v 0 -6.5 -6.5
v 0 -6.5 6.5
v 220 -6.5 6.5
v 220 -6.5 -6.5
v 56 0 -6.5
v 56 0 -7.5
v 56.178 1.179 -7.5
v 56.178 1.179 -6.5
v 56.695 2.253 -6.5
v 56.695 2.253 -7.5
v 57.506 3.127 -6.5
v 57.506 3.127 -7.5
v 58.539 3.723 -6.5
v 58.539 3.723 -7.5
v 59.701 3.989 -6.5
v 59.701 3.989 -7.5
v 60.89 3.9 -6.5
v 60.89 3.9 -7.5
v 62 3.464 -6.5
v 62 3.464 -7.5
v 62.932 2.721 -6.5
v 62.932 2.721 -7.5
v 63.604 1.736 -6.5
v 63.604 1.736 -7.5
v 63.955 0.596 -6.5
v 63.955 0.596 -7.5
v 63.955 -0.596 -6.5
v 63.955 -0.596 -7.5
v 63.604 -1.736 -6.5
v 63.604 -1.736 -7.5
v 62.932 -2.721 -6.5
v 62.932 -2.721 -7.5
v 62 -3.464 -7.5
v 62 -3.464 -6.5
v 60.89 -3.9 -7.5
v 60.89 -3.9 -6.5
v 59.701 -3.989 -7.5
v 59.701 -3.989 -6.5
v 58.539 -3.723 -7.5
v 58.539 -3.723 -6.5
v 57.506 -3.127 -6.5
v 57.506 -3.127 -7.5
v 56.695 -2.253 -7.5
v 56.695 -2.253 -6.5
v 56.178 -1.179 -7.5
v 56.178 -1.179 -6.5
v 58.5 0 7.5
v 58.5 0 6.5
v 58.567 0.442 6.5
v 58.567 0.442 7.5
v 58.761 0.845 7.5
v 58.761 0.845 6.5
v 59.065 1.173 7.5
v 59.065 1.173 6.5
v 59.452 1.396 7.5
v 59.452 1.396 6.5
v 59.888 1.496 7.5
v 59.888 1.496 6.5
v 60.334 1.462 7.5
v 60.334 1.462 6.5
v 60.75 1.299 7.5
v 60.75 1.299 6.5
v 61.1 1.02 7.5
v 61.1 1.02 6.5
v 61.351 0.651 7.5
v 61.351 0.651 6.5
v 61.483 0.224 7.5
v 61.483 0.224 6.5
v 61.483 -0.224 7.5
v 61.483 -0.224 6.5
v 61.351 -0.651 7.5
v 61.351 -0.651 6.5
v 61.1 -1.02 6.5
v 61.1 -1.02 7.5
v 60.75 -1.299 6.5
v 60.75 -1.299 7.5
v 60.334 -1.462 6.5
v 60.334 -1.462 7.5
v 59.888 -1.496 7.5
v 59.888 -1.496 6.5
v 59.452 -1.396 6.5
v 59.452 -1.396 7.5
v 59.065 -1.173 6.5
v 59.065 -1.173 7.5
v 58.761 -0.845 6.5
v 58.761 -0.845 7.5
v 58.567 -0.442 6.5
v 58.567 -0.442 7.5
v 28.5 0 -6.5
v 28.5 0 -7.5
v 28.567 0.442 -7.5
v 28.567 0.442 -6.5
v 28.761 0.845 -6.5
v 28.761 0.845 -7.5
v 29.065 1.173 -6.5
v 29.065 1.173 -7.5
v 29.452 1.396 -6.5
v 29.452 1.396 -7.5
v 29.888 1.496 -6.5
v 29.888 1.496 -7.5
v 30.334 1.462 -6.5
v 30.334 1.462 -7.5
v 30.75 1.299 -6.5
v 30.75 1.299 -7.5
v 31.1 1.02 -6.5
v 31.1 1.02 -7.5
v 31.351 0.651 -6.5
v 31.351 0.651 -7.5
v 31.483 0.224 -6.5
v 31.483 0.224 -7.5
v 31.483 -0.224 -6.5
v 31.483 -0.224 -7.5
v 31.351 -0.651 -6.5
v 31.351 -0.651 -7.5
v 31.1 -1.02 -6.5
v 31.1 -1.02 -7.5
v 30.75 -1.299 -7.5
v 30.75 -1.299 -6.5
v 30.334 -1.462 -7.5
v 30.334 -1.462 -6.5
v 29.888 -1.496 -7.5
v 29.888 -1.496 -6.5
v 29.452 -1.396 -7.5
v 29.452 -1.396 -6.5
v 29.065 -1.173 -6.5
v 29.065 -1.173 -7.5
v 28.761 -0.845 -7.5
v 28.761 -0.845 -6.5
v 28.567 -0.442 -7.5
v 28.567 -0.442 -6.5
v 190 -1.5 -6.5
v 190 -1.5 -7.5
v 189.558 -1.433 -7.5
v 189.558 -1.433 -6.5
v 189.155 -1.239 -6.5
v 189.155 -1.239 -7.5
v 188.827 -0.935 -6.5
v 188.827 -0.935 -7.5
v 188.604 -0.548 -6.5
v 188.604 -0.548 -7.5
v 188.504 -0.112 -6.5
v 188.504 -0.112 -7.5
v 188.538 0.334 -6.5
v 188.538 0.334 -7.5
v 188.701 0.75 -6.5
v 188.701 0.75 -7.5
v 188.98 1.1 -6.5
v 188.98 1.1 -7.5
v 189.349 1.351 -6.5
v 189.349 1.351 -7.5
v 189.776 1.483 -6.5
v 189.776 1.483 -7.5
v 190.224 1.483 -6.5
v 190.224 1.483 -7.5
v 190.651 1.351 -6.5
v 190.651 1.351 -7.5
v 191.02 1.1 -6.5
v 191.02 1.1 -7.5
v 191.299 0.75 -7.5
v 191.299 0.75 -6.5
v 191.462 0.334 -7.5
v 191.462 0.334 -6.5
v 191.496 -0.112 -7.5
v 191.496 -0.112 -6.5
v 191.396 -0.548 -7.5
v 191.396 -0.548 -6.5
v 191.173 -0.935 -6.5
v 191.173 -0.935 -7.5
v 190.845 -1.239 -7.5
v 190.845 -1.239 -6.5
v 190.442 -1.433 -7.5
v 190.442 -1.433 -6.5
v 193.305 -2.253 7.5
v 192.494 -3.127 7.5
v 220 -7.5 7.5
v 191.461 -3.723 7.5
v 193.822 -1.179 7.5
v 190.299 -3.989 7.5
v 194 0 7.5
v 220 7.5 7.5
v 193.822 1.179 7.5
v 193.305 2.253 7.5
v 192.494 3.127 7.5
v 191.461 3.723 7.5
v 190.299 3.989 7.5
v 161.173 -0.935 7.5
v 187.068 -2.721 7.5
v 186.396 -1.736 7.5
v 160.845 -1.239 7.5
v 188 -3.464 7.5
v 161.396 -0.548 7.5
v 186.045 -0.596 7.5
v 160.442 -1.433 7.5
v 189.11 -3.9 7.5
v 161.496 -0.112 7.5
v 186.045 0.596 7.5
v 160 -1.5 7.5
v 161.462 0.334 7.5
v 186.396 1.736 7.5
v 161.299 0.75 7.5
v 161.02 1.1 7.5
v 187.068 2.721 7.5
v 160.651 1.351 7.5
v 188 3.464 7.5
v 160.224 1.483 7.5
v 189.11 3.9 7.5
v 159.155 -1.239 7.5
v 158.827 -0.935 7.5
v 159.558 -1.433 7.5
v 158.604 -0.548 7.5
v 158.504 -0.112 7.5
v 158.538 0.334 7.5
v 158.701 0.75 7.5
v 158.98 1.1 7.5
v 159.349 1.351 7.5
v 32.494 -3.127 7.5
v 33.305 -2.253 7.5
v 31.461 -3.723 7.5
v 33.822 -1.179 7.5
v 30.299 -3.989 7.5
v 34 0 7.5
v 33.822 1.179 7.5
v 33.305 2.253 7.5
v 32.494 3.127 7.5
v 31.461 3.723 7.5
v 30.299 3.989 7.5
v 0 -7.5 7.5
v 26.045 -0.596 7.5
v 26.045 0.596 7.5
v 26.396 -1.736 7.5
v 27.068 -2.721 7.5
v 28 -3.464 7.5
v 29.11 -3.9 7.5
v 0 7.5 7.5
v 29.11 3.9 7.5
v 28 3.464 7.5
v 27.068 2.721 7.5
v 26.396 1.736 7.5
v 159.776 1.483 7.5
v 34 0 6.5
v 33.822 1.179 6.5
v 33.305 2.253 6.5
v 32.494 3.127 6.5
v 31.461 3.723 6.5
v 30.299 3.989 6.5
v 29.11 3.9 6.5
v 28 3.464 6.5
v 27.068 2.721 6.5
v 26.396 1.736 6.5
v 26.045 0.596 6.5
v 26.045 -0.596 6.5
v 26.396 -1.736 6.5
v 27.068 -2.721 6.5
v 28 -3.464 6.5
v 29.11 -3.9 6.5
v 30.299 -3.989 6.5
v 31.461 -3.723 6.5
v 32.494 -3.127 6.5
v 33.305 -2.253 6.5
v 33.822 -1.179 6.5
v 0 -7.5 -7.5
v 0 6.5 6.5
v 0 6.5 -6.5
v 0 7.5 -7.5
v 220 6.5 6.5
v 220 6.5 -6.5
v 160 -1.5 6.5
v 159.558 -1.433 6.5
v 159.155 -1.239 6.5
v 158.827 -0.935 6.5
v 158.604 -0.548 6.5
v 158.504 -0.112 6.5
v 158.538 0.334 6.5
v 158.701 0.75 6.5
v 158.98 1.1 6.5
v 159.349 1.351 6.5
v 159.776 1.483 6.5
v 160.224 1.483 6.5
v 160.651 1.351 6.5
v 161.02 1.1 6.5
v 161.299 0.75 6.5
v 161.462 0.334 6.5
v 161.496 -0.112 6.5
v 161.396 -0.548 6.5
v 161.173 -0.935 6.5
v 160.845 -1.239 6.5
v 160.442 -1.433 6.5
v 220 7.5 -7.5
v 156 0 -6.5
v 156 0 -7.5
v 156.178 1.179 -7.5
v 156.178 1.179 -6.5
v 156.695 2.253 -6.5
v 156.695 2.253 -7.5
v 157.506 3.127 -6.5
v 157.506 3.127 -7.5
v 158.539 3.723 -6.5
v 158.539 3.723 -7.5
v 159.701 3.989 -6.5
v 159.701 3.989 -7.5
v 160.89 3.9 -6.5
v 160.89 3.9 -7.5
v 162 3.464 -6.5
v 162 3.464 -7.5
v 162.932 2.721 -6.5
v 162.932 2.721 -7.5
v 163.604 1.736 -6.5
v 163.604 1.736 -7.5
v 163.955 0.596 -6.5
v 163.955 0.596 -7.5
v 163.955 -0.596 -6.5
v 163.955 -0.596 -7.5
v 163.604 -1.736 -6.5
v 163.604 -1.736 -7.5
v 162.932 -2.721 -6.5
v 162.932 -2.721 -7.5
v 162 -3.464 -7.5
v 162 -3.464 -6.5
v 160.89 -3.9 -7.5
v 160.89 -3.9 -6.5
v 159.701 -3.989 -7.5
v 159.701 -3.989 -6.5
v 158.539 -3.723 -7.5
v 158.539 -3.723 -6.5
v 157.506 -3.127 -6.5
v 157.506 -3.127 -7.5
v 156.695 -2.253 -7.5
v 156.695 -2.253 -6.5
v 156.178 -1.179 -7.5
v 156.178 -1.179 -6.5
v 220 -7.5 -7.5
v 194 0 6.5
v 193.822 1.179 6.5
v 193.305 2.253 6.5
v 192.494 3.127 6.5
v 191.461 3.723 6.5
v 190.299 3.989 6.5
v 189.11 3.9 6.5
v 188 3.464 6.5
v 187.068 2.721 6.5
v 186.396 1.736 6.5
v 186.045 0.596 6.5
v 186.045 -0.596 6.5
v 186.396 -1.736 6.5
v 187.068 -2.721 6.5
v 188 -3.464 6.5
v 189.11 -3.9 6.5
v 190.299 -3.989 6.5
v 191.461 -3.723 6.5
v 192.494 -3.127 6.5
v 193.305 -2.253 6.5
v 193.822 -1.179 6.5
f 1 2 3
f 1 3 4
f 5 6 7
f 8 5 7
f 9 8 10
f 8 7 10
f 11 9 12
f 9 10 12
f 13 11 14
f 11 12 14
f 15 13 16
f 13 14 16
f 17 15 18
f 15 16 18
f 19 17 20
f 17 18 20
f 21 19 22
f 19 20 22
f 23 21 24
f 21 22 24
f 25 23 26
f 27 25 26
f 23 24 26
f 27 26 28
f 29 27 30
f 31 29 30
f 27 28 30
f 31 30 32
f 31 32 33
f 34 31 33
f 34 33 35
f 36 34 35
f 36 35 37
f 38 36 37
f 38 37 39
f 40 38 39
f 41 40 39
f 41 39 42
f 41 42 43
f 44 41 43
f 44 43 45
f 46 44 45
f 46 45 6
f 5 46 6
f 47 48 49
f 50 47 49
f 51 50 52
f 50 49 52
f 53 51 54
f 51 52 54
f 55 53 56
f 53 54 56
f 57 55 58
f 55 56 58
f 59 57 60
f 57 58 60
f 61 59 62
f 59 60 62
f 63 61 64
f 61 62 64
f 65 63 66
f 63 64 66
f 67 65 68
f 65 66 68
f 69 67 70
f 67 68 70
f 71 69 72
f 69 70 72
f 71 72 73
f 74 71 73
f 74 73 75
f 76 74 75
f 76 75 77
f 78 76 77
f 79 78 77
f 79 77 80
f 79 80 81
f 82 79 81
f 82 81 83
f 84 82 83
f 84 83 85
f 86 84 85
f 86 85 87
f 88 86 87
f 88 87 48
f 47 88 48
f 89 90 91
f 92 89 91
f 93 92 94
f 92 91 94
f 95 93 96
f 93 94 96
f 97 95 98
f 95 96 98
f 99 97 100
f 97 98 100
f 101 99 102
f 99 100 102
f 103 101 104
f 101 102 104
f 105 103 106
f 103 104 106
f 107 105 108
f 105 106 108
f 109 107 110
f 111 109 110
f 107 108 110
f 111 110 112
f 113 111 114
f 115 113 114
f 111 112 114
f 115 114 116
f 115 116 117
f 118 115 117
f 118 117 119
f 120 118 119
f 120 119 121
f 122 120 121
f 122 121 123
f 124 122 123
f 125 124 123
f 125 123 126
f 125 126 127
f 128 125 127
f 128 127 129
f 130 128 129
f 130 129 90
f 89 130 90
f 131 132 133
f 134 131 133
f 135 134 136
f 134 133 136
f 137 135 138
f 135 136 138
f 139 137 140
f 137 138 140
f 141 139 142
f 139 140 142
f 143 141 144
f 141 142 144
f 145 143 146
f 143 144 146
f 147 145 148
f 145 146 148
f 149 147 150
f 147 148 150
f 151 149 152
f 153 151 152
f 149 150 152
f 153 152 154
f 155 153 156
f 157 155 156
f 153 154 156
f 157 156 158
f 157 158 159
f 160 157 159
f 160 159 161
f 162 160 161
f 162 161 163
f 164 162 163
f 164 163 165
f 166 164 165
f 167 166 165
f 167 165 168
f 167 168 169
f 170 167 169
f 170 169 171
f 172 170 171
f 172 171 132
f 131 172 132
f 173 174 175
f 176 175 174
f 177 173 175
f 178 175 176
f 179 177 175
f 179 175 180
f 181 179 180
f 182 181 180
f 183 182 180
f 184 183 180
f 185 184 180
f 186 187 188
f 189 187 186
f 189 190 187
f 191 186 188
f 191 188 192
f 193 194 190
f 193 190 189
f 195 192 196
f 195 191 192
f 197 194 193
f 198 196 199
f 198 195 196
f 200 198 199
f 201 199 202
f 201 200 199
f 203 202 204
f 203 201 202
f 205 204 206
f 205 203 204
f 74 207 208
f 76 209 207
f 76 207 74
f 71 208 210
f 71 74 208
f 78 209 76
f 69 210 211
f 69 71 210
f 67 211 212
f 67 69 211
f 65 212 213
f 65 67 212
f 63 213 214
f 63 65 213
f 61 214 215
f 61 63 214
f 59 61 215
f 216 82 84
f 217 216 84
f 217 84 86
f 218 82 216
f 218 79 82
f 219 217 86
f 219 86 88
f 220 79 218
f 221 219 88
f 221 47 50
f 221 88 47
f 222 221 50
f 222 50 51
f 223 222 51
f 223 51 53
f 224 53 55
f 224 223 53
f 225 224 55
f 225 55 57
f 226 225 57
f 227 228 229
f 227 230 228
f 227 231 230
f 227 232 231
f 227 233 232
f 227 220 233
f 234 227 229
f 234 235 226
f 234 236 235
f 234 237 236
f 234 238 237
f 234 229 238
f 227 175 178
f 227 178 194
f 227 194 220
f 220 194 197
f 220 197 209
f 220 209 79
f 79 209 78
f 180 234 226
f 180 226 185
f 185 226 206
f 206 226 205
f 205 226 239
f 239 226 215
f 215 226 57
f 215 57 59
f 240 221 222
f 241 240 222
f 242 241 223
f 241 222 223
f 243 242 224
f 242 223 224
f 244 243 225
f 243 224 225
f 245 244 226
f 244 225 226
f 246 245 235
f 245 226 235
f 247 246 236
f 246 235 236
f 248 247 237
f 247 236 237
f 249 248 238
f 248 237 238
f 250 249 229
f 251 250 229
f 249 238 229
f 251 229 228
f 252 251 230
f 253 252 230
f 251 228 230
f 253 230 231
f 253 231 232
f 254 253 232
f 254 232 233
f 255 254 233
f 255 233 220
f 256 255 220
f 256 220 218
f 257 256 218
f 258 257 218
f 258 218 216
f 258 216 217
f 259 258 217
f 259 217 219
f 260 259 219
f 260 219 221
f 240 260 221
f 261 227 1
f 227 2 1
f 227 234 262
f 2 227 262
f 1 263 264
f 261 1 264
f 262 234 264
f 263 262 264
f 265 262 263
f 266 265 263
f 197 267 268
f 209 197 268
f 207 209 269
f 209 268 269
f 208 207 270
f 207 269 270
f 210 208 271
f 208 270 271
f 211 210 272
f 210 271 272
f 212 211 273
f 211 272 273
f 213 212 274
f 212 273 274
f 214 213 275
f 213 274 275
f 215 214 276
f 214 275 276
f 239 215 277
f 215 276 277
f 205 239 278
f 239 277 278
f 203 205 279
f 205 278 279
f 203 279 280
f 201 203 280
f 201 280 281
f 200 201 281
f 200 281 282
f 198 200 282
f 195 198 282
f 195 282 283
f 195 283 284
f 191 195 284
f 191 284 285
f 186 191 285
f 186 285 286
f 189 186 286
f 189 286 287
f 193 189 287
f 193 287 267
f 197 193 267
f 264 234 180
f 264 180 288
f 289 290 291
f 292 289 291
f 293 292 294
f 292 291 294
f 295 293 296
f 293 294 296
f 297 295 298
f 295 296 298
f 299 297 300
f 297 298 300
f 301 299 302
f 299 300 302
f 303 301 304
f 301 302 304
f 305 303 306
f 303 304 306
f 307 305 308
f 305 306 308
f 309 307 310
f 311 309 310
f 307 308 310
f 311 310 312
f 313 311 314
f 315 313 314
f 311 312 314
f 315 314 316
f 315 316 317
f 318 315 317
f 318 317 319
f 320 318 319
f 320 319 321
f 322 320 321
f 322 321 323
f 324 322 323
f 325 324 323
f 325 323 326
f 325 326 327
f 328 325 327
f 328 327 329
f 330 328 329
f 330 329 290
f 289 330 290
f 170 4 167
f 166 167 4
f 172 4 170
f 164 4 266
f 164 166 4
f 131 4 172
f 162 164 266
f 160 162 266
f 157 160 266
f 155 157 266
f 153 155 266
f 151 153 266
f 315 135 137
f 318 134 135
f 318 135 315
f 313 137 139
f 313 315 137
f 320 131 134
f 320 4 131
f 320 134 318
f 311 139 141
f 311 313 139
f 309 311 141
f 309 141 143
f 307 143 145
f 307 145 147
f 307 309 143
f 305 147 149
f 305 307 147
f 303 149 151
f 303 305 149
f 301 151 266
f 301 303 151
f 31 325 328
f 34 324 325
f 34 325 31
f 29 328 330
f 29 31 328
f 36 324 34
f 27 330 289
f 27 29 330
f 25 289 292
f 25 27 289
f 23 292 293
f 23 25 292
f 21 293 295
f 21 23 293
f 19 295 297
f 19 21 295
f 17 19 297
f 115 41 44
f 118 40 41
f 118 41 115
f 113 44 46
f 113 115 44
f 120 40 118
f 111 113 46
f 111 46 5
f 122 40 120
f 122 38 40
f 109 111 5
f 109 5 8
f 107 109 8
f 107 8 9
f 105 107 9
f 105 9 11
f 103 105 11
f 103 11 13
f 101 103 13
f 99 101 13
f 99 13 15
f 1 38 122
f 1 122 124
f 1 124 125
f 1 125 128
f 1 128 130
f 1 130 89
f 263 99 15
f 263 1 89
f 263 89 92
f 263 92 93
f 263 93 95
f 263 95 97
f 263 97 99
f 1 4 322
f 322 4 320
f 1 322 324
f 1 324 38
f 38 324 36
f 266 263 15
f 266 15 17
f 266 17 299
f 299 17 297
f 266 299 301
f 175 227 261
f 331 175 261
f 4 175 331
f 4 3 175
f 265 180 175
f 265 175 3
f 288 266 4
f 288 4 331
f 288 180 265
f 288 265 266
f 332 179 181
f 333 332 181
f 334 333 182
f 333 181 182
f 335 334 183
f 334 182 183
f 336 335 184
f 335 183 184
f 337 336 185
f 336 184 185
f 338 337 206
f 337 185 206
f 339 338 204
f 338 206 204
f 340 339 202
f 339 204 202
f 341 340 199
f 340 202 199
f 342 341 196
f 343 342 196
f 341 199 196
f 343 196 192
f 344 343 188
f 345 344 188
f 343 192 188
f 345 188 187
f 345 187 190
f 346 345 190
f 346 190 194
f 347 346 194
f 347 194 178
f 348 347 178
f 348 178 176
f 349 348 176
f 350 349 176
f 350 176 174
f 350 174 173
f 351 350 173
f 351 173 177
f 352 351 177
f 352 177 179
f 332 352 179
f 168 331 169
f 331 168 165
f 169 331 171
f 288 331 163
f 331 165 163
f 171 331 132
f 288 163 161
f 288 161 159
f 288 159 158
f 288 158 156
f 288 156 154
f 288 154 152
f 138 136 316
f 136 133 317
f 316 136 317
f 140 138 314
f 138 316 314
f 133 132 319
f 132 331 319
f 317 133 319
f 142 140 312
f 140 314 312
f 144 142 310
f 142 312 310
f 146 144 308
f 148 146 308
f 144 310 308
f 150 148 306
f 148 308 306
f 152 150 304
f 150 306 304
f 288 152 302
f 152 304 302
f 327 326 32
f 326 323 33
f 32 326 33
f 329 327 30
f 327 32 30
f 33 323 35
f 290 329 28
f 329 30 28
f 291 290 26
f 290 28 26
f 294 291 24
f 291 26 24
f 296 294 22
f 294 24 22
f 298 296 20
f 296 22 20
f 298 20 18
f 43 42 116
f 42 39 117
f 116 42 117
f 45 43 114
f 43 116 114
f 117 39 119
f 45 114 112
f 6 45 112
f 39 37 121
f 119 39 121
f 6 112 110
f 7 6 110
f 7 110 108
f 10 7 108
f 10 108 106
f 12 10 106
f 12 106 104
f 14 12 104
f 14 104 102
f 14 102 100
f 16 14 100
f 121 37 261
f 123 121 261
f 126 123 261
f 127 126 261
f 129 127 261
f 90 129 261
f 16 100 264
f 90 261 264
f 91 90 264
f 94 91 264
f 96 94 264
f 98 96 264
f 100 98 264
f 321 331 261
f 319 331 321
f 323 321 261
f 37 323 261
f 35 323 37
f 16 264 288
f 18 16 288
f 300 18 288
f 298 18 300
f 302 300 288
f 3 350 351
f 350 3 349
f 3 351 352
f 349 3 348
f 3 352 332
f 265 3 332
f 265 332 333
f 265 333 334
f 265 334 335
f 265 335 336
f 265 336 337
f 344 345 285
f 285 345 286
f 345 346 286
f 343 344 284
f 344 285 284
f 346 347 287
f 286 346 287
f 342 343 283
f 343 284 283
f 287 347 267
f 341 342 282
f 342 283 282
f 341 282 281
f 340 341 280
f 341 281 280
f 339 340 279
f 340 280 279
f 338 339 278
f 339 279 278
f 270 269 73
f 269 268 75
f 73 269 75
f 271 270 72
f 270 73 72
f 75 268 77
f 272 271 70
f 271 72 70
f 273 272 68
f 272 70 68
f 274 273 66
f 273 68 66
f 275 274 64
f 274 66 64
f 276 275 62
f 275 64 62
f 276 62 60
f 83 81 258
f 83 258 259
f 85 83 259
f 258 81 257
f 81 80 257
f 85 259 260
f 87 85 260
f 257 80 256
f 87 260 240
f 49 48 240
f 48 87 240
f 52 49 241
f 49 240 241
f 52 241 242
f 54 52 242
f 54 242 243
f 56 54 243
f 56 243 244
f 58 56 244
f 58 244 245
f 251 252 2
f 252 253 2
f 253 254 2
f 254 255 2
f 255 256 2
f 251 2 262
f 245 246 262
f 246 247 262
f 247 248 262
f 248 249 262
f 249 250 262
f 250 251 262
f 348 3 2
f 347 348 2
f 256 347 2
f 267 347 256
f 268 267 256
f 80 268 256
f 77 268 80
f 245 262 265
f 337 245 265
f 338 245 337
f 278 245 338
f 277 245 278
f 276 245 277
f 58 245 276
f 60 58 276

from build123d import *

# Parameters (mm, degrees)
SKETCH_1_W          = 15
SKETCH_1_H          = 15
SKETCH_1_W_2        = 13
SKETCH_1_H_2        = 13
EXTRUDE_1_DEPTH     = 220
SKETCH_2_R          = 1.5
CUT_EXTRUDE_4_DEPTH = 221.638278637
SKETCH_5_R          = 4
CUT_EXTRUDE_5_DEPTH = 10
SKETCH_6_R          = 4
CUT_EXTRUDE_6_DEPTH = 10


with BuildPart() as part:
    # 草图1 → 凸台-拉伸1 (new body)
    with BuildSketch(Plane(origin=(0, 0, 0), x_dir=(0, 0, -1), z_dir=(1, 0, 0))):
        Rectangle(SKETCH_1_W, SKETCH_1_H)
        Rectangle(SKETCH_1_W_2, SKETCH_1_H_2, mode=Mode.SUBTRACT)
    extrude(amount=EXTRUDE_1_DEPTH)

    # 草图2 → 切除-拉伸4 (cut, through all)
    with BuildSketch(Plane(origin=(0, 0, -7.5), x_dir=(-1, 0, 0), z_dir=(0, 0, -1))):
        with Locations((-30, 0)):
            Circle(SKETCH_2_R)
        with Locations((-60, 0)):
            Circle(SKETCH_2_R)
        with Locations(Location((-160, 0, 0), (0, 0, 270))):
            Circle(SKETCH_2_R)
        with Locations(Location((-190, 0, 0), (0, 0, 270))):
            Circle(SKETCH_2_R)
    extrude(amount=-CUT_EXTRUDE_4_DEPTH, mode=Mode.SUBTRACT)

    # 草图5 → 切除-拉伸5 (cut)
    with BuildSketch(Plane(origin=(0, 0, -7.5), x_dir=(-1, 0, 0), z_dir=(0, 0, -1))):
        with Locations((-160, 0)):
            Circle(SKETCH_5_R)
        with Locations((-60, 0)):
            Circle(SKETCH_5_R)
    extrude(amount=-CUT_EXTRUDE_5_DEPTH, mode=Mode.SUBTRACT)

    # 草图6 → 切除-拉伸6 (cut)
    with BuildSketch(Plane.XY.offset(7.5)):
        with Locations((190, 0)):
            Circle(SKETCH_6_R)
        with Locations((30, 0)):
            Circle(SKETCH_6_R)
    extrude(amount=-CUT_EXTRUDE_6_DEPTH, mode=Mode.SUBTRACT)


solid = part.part
